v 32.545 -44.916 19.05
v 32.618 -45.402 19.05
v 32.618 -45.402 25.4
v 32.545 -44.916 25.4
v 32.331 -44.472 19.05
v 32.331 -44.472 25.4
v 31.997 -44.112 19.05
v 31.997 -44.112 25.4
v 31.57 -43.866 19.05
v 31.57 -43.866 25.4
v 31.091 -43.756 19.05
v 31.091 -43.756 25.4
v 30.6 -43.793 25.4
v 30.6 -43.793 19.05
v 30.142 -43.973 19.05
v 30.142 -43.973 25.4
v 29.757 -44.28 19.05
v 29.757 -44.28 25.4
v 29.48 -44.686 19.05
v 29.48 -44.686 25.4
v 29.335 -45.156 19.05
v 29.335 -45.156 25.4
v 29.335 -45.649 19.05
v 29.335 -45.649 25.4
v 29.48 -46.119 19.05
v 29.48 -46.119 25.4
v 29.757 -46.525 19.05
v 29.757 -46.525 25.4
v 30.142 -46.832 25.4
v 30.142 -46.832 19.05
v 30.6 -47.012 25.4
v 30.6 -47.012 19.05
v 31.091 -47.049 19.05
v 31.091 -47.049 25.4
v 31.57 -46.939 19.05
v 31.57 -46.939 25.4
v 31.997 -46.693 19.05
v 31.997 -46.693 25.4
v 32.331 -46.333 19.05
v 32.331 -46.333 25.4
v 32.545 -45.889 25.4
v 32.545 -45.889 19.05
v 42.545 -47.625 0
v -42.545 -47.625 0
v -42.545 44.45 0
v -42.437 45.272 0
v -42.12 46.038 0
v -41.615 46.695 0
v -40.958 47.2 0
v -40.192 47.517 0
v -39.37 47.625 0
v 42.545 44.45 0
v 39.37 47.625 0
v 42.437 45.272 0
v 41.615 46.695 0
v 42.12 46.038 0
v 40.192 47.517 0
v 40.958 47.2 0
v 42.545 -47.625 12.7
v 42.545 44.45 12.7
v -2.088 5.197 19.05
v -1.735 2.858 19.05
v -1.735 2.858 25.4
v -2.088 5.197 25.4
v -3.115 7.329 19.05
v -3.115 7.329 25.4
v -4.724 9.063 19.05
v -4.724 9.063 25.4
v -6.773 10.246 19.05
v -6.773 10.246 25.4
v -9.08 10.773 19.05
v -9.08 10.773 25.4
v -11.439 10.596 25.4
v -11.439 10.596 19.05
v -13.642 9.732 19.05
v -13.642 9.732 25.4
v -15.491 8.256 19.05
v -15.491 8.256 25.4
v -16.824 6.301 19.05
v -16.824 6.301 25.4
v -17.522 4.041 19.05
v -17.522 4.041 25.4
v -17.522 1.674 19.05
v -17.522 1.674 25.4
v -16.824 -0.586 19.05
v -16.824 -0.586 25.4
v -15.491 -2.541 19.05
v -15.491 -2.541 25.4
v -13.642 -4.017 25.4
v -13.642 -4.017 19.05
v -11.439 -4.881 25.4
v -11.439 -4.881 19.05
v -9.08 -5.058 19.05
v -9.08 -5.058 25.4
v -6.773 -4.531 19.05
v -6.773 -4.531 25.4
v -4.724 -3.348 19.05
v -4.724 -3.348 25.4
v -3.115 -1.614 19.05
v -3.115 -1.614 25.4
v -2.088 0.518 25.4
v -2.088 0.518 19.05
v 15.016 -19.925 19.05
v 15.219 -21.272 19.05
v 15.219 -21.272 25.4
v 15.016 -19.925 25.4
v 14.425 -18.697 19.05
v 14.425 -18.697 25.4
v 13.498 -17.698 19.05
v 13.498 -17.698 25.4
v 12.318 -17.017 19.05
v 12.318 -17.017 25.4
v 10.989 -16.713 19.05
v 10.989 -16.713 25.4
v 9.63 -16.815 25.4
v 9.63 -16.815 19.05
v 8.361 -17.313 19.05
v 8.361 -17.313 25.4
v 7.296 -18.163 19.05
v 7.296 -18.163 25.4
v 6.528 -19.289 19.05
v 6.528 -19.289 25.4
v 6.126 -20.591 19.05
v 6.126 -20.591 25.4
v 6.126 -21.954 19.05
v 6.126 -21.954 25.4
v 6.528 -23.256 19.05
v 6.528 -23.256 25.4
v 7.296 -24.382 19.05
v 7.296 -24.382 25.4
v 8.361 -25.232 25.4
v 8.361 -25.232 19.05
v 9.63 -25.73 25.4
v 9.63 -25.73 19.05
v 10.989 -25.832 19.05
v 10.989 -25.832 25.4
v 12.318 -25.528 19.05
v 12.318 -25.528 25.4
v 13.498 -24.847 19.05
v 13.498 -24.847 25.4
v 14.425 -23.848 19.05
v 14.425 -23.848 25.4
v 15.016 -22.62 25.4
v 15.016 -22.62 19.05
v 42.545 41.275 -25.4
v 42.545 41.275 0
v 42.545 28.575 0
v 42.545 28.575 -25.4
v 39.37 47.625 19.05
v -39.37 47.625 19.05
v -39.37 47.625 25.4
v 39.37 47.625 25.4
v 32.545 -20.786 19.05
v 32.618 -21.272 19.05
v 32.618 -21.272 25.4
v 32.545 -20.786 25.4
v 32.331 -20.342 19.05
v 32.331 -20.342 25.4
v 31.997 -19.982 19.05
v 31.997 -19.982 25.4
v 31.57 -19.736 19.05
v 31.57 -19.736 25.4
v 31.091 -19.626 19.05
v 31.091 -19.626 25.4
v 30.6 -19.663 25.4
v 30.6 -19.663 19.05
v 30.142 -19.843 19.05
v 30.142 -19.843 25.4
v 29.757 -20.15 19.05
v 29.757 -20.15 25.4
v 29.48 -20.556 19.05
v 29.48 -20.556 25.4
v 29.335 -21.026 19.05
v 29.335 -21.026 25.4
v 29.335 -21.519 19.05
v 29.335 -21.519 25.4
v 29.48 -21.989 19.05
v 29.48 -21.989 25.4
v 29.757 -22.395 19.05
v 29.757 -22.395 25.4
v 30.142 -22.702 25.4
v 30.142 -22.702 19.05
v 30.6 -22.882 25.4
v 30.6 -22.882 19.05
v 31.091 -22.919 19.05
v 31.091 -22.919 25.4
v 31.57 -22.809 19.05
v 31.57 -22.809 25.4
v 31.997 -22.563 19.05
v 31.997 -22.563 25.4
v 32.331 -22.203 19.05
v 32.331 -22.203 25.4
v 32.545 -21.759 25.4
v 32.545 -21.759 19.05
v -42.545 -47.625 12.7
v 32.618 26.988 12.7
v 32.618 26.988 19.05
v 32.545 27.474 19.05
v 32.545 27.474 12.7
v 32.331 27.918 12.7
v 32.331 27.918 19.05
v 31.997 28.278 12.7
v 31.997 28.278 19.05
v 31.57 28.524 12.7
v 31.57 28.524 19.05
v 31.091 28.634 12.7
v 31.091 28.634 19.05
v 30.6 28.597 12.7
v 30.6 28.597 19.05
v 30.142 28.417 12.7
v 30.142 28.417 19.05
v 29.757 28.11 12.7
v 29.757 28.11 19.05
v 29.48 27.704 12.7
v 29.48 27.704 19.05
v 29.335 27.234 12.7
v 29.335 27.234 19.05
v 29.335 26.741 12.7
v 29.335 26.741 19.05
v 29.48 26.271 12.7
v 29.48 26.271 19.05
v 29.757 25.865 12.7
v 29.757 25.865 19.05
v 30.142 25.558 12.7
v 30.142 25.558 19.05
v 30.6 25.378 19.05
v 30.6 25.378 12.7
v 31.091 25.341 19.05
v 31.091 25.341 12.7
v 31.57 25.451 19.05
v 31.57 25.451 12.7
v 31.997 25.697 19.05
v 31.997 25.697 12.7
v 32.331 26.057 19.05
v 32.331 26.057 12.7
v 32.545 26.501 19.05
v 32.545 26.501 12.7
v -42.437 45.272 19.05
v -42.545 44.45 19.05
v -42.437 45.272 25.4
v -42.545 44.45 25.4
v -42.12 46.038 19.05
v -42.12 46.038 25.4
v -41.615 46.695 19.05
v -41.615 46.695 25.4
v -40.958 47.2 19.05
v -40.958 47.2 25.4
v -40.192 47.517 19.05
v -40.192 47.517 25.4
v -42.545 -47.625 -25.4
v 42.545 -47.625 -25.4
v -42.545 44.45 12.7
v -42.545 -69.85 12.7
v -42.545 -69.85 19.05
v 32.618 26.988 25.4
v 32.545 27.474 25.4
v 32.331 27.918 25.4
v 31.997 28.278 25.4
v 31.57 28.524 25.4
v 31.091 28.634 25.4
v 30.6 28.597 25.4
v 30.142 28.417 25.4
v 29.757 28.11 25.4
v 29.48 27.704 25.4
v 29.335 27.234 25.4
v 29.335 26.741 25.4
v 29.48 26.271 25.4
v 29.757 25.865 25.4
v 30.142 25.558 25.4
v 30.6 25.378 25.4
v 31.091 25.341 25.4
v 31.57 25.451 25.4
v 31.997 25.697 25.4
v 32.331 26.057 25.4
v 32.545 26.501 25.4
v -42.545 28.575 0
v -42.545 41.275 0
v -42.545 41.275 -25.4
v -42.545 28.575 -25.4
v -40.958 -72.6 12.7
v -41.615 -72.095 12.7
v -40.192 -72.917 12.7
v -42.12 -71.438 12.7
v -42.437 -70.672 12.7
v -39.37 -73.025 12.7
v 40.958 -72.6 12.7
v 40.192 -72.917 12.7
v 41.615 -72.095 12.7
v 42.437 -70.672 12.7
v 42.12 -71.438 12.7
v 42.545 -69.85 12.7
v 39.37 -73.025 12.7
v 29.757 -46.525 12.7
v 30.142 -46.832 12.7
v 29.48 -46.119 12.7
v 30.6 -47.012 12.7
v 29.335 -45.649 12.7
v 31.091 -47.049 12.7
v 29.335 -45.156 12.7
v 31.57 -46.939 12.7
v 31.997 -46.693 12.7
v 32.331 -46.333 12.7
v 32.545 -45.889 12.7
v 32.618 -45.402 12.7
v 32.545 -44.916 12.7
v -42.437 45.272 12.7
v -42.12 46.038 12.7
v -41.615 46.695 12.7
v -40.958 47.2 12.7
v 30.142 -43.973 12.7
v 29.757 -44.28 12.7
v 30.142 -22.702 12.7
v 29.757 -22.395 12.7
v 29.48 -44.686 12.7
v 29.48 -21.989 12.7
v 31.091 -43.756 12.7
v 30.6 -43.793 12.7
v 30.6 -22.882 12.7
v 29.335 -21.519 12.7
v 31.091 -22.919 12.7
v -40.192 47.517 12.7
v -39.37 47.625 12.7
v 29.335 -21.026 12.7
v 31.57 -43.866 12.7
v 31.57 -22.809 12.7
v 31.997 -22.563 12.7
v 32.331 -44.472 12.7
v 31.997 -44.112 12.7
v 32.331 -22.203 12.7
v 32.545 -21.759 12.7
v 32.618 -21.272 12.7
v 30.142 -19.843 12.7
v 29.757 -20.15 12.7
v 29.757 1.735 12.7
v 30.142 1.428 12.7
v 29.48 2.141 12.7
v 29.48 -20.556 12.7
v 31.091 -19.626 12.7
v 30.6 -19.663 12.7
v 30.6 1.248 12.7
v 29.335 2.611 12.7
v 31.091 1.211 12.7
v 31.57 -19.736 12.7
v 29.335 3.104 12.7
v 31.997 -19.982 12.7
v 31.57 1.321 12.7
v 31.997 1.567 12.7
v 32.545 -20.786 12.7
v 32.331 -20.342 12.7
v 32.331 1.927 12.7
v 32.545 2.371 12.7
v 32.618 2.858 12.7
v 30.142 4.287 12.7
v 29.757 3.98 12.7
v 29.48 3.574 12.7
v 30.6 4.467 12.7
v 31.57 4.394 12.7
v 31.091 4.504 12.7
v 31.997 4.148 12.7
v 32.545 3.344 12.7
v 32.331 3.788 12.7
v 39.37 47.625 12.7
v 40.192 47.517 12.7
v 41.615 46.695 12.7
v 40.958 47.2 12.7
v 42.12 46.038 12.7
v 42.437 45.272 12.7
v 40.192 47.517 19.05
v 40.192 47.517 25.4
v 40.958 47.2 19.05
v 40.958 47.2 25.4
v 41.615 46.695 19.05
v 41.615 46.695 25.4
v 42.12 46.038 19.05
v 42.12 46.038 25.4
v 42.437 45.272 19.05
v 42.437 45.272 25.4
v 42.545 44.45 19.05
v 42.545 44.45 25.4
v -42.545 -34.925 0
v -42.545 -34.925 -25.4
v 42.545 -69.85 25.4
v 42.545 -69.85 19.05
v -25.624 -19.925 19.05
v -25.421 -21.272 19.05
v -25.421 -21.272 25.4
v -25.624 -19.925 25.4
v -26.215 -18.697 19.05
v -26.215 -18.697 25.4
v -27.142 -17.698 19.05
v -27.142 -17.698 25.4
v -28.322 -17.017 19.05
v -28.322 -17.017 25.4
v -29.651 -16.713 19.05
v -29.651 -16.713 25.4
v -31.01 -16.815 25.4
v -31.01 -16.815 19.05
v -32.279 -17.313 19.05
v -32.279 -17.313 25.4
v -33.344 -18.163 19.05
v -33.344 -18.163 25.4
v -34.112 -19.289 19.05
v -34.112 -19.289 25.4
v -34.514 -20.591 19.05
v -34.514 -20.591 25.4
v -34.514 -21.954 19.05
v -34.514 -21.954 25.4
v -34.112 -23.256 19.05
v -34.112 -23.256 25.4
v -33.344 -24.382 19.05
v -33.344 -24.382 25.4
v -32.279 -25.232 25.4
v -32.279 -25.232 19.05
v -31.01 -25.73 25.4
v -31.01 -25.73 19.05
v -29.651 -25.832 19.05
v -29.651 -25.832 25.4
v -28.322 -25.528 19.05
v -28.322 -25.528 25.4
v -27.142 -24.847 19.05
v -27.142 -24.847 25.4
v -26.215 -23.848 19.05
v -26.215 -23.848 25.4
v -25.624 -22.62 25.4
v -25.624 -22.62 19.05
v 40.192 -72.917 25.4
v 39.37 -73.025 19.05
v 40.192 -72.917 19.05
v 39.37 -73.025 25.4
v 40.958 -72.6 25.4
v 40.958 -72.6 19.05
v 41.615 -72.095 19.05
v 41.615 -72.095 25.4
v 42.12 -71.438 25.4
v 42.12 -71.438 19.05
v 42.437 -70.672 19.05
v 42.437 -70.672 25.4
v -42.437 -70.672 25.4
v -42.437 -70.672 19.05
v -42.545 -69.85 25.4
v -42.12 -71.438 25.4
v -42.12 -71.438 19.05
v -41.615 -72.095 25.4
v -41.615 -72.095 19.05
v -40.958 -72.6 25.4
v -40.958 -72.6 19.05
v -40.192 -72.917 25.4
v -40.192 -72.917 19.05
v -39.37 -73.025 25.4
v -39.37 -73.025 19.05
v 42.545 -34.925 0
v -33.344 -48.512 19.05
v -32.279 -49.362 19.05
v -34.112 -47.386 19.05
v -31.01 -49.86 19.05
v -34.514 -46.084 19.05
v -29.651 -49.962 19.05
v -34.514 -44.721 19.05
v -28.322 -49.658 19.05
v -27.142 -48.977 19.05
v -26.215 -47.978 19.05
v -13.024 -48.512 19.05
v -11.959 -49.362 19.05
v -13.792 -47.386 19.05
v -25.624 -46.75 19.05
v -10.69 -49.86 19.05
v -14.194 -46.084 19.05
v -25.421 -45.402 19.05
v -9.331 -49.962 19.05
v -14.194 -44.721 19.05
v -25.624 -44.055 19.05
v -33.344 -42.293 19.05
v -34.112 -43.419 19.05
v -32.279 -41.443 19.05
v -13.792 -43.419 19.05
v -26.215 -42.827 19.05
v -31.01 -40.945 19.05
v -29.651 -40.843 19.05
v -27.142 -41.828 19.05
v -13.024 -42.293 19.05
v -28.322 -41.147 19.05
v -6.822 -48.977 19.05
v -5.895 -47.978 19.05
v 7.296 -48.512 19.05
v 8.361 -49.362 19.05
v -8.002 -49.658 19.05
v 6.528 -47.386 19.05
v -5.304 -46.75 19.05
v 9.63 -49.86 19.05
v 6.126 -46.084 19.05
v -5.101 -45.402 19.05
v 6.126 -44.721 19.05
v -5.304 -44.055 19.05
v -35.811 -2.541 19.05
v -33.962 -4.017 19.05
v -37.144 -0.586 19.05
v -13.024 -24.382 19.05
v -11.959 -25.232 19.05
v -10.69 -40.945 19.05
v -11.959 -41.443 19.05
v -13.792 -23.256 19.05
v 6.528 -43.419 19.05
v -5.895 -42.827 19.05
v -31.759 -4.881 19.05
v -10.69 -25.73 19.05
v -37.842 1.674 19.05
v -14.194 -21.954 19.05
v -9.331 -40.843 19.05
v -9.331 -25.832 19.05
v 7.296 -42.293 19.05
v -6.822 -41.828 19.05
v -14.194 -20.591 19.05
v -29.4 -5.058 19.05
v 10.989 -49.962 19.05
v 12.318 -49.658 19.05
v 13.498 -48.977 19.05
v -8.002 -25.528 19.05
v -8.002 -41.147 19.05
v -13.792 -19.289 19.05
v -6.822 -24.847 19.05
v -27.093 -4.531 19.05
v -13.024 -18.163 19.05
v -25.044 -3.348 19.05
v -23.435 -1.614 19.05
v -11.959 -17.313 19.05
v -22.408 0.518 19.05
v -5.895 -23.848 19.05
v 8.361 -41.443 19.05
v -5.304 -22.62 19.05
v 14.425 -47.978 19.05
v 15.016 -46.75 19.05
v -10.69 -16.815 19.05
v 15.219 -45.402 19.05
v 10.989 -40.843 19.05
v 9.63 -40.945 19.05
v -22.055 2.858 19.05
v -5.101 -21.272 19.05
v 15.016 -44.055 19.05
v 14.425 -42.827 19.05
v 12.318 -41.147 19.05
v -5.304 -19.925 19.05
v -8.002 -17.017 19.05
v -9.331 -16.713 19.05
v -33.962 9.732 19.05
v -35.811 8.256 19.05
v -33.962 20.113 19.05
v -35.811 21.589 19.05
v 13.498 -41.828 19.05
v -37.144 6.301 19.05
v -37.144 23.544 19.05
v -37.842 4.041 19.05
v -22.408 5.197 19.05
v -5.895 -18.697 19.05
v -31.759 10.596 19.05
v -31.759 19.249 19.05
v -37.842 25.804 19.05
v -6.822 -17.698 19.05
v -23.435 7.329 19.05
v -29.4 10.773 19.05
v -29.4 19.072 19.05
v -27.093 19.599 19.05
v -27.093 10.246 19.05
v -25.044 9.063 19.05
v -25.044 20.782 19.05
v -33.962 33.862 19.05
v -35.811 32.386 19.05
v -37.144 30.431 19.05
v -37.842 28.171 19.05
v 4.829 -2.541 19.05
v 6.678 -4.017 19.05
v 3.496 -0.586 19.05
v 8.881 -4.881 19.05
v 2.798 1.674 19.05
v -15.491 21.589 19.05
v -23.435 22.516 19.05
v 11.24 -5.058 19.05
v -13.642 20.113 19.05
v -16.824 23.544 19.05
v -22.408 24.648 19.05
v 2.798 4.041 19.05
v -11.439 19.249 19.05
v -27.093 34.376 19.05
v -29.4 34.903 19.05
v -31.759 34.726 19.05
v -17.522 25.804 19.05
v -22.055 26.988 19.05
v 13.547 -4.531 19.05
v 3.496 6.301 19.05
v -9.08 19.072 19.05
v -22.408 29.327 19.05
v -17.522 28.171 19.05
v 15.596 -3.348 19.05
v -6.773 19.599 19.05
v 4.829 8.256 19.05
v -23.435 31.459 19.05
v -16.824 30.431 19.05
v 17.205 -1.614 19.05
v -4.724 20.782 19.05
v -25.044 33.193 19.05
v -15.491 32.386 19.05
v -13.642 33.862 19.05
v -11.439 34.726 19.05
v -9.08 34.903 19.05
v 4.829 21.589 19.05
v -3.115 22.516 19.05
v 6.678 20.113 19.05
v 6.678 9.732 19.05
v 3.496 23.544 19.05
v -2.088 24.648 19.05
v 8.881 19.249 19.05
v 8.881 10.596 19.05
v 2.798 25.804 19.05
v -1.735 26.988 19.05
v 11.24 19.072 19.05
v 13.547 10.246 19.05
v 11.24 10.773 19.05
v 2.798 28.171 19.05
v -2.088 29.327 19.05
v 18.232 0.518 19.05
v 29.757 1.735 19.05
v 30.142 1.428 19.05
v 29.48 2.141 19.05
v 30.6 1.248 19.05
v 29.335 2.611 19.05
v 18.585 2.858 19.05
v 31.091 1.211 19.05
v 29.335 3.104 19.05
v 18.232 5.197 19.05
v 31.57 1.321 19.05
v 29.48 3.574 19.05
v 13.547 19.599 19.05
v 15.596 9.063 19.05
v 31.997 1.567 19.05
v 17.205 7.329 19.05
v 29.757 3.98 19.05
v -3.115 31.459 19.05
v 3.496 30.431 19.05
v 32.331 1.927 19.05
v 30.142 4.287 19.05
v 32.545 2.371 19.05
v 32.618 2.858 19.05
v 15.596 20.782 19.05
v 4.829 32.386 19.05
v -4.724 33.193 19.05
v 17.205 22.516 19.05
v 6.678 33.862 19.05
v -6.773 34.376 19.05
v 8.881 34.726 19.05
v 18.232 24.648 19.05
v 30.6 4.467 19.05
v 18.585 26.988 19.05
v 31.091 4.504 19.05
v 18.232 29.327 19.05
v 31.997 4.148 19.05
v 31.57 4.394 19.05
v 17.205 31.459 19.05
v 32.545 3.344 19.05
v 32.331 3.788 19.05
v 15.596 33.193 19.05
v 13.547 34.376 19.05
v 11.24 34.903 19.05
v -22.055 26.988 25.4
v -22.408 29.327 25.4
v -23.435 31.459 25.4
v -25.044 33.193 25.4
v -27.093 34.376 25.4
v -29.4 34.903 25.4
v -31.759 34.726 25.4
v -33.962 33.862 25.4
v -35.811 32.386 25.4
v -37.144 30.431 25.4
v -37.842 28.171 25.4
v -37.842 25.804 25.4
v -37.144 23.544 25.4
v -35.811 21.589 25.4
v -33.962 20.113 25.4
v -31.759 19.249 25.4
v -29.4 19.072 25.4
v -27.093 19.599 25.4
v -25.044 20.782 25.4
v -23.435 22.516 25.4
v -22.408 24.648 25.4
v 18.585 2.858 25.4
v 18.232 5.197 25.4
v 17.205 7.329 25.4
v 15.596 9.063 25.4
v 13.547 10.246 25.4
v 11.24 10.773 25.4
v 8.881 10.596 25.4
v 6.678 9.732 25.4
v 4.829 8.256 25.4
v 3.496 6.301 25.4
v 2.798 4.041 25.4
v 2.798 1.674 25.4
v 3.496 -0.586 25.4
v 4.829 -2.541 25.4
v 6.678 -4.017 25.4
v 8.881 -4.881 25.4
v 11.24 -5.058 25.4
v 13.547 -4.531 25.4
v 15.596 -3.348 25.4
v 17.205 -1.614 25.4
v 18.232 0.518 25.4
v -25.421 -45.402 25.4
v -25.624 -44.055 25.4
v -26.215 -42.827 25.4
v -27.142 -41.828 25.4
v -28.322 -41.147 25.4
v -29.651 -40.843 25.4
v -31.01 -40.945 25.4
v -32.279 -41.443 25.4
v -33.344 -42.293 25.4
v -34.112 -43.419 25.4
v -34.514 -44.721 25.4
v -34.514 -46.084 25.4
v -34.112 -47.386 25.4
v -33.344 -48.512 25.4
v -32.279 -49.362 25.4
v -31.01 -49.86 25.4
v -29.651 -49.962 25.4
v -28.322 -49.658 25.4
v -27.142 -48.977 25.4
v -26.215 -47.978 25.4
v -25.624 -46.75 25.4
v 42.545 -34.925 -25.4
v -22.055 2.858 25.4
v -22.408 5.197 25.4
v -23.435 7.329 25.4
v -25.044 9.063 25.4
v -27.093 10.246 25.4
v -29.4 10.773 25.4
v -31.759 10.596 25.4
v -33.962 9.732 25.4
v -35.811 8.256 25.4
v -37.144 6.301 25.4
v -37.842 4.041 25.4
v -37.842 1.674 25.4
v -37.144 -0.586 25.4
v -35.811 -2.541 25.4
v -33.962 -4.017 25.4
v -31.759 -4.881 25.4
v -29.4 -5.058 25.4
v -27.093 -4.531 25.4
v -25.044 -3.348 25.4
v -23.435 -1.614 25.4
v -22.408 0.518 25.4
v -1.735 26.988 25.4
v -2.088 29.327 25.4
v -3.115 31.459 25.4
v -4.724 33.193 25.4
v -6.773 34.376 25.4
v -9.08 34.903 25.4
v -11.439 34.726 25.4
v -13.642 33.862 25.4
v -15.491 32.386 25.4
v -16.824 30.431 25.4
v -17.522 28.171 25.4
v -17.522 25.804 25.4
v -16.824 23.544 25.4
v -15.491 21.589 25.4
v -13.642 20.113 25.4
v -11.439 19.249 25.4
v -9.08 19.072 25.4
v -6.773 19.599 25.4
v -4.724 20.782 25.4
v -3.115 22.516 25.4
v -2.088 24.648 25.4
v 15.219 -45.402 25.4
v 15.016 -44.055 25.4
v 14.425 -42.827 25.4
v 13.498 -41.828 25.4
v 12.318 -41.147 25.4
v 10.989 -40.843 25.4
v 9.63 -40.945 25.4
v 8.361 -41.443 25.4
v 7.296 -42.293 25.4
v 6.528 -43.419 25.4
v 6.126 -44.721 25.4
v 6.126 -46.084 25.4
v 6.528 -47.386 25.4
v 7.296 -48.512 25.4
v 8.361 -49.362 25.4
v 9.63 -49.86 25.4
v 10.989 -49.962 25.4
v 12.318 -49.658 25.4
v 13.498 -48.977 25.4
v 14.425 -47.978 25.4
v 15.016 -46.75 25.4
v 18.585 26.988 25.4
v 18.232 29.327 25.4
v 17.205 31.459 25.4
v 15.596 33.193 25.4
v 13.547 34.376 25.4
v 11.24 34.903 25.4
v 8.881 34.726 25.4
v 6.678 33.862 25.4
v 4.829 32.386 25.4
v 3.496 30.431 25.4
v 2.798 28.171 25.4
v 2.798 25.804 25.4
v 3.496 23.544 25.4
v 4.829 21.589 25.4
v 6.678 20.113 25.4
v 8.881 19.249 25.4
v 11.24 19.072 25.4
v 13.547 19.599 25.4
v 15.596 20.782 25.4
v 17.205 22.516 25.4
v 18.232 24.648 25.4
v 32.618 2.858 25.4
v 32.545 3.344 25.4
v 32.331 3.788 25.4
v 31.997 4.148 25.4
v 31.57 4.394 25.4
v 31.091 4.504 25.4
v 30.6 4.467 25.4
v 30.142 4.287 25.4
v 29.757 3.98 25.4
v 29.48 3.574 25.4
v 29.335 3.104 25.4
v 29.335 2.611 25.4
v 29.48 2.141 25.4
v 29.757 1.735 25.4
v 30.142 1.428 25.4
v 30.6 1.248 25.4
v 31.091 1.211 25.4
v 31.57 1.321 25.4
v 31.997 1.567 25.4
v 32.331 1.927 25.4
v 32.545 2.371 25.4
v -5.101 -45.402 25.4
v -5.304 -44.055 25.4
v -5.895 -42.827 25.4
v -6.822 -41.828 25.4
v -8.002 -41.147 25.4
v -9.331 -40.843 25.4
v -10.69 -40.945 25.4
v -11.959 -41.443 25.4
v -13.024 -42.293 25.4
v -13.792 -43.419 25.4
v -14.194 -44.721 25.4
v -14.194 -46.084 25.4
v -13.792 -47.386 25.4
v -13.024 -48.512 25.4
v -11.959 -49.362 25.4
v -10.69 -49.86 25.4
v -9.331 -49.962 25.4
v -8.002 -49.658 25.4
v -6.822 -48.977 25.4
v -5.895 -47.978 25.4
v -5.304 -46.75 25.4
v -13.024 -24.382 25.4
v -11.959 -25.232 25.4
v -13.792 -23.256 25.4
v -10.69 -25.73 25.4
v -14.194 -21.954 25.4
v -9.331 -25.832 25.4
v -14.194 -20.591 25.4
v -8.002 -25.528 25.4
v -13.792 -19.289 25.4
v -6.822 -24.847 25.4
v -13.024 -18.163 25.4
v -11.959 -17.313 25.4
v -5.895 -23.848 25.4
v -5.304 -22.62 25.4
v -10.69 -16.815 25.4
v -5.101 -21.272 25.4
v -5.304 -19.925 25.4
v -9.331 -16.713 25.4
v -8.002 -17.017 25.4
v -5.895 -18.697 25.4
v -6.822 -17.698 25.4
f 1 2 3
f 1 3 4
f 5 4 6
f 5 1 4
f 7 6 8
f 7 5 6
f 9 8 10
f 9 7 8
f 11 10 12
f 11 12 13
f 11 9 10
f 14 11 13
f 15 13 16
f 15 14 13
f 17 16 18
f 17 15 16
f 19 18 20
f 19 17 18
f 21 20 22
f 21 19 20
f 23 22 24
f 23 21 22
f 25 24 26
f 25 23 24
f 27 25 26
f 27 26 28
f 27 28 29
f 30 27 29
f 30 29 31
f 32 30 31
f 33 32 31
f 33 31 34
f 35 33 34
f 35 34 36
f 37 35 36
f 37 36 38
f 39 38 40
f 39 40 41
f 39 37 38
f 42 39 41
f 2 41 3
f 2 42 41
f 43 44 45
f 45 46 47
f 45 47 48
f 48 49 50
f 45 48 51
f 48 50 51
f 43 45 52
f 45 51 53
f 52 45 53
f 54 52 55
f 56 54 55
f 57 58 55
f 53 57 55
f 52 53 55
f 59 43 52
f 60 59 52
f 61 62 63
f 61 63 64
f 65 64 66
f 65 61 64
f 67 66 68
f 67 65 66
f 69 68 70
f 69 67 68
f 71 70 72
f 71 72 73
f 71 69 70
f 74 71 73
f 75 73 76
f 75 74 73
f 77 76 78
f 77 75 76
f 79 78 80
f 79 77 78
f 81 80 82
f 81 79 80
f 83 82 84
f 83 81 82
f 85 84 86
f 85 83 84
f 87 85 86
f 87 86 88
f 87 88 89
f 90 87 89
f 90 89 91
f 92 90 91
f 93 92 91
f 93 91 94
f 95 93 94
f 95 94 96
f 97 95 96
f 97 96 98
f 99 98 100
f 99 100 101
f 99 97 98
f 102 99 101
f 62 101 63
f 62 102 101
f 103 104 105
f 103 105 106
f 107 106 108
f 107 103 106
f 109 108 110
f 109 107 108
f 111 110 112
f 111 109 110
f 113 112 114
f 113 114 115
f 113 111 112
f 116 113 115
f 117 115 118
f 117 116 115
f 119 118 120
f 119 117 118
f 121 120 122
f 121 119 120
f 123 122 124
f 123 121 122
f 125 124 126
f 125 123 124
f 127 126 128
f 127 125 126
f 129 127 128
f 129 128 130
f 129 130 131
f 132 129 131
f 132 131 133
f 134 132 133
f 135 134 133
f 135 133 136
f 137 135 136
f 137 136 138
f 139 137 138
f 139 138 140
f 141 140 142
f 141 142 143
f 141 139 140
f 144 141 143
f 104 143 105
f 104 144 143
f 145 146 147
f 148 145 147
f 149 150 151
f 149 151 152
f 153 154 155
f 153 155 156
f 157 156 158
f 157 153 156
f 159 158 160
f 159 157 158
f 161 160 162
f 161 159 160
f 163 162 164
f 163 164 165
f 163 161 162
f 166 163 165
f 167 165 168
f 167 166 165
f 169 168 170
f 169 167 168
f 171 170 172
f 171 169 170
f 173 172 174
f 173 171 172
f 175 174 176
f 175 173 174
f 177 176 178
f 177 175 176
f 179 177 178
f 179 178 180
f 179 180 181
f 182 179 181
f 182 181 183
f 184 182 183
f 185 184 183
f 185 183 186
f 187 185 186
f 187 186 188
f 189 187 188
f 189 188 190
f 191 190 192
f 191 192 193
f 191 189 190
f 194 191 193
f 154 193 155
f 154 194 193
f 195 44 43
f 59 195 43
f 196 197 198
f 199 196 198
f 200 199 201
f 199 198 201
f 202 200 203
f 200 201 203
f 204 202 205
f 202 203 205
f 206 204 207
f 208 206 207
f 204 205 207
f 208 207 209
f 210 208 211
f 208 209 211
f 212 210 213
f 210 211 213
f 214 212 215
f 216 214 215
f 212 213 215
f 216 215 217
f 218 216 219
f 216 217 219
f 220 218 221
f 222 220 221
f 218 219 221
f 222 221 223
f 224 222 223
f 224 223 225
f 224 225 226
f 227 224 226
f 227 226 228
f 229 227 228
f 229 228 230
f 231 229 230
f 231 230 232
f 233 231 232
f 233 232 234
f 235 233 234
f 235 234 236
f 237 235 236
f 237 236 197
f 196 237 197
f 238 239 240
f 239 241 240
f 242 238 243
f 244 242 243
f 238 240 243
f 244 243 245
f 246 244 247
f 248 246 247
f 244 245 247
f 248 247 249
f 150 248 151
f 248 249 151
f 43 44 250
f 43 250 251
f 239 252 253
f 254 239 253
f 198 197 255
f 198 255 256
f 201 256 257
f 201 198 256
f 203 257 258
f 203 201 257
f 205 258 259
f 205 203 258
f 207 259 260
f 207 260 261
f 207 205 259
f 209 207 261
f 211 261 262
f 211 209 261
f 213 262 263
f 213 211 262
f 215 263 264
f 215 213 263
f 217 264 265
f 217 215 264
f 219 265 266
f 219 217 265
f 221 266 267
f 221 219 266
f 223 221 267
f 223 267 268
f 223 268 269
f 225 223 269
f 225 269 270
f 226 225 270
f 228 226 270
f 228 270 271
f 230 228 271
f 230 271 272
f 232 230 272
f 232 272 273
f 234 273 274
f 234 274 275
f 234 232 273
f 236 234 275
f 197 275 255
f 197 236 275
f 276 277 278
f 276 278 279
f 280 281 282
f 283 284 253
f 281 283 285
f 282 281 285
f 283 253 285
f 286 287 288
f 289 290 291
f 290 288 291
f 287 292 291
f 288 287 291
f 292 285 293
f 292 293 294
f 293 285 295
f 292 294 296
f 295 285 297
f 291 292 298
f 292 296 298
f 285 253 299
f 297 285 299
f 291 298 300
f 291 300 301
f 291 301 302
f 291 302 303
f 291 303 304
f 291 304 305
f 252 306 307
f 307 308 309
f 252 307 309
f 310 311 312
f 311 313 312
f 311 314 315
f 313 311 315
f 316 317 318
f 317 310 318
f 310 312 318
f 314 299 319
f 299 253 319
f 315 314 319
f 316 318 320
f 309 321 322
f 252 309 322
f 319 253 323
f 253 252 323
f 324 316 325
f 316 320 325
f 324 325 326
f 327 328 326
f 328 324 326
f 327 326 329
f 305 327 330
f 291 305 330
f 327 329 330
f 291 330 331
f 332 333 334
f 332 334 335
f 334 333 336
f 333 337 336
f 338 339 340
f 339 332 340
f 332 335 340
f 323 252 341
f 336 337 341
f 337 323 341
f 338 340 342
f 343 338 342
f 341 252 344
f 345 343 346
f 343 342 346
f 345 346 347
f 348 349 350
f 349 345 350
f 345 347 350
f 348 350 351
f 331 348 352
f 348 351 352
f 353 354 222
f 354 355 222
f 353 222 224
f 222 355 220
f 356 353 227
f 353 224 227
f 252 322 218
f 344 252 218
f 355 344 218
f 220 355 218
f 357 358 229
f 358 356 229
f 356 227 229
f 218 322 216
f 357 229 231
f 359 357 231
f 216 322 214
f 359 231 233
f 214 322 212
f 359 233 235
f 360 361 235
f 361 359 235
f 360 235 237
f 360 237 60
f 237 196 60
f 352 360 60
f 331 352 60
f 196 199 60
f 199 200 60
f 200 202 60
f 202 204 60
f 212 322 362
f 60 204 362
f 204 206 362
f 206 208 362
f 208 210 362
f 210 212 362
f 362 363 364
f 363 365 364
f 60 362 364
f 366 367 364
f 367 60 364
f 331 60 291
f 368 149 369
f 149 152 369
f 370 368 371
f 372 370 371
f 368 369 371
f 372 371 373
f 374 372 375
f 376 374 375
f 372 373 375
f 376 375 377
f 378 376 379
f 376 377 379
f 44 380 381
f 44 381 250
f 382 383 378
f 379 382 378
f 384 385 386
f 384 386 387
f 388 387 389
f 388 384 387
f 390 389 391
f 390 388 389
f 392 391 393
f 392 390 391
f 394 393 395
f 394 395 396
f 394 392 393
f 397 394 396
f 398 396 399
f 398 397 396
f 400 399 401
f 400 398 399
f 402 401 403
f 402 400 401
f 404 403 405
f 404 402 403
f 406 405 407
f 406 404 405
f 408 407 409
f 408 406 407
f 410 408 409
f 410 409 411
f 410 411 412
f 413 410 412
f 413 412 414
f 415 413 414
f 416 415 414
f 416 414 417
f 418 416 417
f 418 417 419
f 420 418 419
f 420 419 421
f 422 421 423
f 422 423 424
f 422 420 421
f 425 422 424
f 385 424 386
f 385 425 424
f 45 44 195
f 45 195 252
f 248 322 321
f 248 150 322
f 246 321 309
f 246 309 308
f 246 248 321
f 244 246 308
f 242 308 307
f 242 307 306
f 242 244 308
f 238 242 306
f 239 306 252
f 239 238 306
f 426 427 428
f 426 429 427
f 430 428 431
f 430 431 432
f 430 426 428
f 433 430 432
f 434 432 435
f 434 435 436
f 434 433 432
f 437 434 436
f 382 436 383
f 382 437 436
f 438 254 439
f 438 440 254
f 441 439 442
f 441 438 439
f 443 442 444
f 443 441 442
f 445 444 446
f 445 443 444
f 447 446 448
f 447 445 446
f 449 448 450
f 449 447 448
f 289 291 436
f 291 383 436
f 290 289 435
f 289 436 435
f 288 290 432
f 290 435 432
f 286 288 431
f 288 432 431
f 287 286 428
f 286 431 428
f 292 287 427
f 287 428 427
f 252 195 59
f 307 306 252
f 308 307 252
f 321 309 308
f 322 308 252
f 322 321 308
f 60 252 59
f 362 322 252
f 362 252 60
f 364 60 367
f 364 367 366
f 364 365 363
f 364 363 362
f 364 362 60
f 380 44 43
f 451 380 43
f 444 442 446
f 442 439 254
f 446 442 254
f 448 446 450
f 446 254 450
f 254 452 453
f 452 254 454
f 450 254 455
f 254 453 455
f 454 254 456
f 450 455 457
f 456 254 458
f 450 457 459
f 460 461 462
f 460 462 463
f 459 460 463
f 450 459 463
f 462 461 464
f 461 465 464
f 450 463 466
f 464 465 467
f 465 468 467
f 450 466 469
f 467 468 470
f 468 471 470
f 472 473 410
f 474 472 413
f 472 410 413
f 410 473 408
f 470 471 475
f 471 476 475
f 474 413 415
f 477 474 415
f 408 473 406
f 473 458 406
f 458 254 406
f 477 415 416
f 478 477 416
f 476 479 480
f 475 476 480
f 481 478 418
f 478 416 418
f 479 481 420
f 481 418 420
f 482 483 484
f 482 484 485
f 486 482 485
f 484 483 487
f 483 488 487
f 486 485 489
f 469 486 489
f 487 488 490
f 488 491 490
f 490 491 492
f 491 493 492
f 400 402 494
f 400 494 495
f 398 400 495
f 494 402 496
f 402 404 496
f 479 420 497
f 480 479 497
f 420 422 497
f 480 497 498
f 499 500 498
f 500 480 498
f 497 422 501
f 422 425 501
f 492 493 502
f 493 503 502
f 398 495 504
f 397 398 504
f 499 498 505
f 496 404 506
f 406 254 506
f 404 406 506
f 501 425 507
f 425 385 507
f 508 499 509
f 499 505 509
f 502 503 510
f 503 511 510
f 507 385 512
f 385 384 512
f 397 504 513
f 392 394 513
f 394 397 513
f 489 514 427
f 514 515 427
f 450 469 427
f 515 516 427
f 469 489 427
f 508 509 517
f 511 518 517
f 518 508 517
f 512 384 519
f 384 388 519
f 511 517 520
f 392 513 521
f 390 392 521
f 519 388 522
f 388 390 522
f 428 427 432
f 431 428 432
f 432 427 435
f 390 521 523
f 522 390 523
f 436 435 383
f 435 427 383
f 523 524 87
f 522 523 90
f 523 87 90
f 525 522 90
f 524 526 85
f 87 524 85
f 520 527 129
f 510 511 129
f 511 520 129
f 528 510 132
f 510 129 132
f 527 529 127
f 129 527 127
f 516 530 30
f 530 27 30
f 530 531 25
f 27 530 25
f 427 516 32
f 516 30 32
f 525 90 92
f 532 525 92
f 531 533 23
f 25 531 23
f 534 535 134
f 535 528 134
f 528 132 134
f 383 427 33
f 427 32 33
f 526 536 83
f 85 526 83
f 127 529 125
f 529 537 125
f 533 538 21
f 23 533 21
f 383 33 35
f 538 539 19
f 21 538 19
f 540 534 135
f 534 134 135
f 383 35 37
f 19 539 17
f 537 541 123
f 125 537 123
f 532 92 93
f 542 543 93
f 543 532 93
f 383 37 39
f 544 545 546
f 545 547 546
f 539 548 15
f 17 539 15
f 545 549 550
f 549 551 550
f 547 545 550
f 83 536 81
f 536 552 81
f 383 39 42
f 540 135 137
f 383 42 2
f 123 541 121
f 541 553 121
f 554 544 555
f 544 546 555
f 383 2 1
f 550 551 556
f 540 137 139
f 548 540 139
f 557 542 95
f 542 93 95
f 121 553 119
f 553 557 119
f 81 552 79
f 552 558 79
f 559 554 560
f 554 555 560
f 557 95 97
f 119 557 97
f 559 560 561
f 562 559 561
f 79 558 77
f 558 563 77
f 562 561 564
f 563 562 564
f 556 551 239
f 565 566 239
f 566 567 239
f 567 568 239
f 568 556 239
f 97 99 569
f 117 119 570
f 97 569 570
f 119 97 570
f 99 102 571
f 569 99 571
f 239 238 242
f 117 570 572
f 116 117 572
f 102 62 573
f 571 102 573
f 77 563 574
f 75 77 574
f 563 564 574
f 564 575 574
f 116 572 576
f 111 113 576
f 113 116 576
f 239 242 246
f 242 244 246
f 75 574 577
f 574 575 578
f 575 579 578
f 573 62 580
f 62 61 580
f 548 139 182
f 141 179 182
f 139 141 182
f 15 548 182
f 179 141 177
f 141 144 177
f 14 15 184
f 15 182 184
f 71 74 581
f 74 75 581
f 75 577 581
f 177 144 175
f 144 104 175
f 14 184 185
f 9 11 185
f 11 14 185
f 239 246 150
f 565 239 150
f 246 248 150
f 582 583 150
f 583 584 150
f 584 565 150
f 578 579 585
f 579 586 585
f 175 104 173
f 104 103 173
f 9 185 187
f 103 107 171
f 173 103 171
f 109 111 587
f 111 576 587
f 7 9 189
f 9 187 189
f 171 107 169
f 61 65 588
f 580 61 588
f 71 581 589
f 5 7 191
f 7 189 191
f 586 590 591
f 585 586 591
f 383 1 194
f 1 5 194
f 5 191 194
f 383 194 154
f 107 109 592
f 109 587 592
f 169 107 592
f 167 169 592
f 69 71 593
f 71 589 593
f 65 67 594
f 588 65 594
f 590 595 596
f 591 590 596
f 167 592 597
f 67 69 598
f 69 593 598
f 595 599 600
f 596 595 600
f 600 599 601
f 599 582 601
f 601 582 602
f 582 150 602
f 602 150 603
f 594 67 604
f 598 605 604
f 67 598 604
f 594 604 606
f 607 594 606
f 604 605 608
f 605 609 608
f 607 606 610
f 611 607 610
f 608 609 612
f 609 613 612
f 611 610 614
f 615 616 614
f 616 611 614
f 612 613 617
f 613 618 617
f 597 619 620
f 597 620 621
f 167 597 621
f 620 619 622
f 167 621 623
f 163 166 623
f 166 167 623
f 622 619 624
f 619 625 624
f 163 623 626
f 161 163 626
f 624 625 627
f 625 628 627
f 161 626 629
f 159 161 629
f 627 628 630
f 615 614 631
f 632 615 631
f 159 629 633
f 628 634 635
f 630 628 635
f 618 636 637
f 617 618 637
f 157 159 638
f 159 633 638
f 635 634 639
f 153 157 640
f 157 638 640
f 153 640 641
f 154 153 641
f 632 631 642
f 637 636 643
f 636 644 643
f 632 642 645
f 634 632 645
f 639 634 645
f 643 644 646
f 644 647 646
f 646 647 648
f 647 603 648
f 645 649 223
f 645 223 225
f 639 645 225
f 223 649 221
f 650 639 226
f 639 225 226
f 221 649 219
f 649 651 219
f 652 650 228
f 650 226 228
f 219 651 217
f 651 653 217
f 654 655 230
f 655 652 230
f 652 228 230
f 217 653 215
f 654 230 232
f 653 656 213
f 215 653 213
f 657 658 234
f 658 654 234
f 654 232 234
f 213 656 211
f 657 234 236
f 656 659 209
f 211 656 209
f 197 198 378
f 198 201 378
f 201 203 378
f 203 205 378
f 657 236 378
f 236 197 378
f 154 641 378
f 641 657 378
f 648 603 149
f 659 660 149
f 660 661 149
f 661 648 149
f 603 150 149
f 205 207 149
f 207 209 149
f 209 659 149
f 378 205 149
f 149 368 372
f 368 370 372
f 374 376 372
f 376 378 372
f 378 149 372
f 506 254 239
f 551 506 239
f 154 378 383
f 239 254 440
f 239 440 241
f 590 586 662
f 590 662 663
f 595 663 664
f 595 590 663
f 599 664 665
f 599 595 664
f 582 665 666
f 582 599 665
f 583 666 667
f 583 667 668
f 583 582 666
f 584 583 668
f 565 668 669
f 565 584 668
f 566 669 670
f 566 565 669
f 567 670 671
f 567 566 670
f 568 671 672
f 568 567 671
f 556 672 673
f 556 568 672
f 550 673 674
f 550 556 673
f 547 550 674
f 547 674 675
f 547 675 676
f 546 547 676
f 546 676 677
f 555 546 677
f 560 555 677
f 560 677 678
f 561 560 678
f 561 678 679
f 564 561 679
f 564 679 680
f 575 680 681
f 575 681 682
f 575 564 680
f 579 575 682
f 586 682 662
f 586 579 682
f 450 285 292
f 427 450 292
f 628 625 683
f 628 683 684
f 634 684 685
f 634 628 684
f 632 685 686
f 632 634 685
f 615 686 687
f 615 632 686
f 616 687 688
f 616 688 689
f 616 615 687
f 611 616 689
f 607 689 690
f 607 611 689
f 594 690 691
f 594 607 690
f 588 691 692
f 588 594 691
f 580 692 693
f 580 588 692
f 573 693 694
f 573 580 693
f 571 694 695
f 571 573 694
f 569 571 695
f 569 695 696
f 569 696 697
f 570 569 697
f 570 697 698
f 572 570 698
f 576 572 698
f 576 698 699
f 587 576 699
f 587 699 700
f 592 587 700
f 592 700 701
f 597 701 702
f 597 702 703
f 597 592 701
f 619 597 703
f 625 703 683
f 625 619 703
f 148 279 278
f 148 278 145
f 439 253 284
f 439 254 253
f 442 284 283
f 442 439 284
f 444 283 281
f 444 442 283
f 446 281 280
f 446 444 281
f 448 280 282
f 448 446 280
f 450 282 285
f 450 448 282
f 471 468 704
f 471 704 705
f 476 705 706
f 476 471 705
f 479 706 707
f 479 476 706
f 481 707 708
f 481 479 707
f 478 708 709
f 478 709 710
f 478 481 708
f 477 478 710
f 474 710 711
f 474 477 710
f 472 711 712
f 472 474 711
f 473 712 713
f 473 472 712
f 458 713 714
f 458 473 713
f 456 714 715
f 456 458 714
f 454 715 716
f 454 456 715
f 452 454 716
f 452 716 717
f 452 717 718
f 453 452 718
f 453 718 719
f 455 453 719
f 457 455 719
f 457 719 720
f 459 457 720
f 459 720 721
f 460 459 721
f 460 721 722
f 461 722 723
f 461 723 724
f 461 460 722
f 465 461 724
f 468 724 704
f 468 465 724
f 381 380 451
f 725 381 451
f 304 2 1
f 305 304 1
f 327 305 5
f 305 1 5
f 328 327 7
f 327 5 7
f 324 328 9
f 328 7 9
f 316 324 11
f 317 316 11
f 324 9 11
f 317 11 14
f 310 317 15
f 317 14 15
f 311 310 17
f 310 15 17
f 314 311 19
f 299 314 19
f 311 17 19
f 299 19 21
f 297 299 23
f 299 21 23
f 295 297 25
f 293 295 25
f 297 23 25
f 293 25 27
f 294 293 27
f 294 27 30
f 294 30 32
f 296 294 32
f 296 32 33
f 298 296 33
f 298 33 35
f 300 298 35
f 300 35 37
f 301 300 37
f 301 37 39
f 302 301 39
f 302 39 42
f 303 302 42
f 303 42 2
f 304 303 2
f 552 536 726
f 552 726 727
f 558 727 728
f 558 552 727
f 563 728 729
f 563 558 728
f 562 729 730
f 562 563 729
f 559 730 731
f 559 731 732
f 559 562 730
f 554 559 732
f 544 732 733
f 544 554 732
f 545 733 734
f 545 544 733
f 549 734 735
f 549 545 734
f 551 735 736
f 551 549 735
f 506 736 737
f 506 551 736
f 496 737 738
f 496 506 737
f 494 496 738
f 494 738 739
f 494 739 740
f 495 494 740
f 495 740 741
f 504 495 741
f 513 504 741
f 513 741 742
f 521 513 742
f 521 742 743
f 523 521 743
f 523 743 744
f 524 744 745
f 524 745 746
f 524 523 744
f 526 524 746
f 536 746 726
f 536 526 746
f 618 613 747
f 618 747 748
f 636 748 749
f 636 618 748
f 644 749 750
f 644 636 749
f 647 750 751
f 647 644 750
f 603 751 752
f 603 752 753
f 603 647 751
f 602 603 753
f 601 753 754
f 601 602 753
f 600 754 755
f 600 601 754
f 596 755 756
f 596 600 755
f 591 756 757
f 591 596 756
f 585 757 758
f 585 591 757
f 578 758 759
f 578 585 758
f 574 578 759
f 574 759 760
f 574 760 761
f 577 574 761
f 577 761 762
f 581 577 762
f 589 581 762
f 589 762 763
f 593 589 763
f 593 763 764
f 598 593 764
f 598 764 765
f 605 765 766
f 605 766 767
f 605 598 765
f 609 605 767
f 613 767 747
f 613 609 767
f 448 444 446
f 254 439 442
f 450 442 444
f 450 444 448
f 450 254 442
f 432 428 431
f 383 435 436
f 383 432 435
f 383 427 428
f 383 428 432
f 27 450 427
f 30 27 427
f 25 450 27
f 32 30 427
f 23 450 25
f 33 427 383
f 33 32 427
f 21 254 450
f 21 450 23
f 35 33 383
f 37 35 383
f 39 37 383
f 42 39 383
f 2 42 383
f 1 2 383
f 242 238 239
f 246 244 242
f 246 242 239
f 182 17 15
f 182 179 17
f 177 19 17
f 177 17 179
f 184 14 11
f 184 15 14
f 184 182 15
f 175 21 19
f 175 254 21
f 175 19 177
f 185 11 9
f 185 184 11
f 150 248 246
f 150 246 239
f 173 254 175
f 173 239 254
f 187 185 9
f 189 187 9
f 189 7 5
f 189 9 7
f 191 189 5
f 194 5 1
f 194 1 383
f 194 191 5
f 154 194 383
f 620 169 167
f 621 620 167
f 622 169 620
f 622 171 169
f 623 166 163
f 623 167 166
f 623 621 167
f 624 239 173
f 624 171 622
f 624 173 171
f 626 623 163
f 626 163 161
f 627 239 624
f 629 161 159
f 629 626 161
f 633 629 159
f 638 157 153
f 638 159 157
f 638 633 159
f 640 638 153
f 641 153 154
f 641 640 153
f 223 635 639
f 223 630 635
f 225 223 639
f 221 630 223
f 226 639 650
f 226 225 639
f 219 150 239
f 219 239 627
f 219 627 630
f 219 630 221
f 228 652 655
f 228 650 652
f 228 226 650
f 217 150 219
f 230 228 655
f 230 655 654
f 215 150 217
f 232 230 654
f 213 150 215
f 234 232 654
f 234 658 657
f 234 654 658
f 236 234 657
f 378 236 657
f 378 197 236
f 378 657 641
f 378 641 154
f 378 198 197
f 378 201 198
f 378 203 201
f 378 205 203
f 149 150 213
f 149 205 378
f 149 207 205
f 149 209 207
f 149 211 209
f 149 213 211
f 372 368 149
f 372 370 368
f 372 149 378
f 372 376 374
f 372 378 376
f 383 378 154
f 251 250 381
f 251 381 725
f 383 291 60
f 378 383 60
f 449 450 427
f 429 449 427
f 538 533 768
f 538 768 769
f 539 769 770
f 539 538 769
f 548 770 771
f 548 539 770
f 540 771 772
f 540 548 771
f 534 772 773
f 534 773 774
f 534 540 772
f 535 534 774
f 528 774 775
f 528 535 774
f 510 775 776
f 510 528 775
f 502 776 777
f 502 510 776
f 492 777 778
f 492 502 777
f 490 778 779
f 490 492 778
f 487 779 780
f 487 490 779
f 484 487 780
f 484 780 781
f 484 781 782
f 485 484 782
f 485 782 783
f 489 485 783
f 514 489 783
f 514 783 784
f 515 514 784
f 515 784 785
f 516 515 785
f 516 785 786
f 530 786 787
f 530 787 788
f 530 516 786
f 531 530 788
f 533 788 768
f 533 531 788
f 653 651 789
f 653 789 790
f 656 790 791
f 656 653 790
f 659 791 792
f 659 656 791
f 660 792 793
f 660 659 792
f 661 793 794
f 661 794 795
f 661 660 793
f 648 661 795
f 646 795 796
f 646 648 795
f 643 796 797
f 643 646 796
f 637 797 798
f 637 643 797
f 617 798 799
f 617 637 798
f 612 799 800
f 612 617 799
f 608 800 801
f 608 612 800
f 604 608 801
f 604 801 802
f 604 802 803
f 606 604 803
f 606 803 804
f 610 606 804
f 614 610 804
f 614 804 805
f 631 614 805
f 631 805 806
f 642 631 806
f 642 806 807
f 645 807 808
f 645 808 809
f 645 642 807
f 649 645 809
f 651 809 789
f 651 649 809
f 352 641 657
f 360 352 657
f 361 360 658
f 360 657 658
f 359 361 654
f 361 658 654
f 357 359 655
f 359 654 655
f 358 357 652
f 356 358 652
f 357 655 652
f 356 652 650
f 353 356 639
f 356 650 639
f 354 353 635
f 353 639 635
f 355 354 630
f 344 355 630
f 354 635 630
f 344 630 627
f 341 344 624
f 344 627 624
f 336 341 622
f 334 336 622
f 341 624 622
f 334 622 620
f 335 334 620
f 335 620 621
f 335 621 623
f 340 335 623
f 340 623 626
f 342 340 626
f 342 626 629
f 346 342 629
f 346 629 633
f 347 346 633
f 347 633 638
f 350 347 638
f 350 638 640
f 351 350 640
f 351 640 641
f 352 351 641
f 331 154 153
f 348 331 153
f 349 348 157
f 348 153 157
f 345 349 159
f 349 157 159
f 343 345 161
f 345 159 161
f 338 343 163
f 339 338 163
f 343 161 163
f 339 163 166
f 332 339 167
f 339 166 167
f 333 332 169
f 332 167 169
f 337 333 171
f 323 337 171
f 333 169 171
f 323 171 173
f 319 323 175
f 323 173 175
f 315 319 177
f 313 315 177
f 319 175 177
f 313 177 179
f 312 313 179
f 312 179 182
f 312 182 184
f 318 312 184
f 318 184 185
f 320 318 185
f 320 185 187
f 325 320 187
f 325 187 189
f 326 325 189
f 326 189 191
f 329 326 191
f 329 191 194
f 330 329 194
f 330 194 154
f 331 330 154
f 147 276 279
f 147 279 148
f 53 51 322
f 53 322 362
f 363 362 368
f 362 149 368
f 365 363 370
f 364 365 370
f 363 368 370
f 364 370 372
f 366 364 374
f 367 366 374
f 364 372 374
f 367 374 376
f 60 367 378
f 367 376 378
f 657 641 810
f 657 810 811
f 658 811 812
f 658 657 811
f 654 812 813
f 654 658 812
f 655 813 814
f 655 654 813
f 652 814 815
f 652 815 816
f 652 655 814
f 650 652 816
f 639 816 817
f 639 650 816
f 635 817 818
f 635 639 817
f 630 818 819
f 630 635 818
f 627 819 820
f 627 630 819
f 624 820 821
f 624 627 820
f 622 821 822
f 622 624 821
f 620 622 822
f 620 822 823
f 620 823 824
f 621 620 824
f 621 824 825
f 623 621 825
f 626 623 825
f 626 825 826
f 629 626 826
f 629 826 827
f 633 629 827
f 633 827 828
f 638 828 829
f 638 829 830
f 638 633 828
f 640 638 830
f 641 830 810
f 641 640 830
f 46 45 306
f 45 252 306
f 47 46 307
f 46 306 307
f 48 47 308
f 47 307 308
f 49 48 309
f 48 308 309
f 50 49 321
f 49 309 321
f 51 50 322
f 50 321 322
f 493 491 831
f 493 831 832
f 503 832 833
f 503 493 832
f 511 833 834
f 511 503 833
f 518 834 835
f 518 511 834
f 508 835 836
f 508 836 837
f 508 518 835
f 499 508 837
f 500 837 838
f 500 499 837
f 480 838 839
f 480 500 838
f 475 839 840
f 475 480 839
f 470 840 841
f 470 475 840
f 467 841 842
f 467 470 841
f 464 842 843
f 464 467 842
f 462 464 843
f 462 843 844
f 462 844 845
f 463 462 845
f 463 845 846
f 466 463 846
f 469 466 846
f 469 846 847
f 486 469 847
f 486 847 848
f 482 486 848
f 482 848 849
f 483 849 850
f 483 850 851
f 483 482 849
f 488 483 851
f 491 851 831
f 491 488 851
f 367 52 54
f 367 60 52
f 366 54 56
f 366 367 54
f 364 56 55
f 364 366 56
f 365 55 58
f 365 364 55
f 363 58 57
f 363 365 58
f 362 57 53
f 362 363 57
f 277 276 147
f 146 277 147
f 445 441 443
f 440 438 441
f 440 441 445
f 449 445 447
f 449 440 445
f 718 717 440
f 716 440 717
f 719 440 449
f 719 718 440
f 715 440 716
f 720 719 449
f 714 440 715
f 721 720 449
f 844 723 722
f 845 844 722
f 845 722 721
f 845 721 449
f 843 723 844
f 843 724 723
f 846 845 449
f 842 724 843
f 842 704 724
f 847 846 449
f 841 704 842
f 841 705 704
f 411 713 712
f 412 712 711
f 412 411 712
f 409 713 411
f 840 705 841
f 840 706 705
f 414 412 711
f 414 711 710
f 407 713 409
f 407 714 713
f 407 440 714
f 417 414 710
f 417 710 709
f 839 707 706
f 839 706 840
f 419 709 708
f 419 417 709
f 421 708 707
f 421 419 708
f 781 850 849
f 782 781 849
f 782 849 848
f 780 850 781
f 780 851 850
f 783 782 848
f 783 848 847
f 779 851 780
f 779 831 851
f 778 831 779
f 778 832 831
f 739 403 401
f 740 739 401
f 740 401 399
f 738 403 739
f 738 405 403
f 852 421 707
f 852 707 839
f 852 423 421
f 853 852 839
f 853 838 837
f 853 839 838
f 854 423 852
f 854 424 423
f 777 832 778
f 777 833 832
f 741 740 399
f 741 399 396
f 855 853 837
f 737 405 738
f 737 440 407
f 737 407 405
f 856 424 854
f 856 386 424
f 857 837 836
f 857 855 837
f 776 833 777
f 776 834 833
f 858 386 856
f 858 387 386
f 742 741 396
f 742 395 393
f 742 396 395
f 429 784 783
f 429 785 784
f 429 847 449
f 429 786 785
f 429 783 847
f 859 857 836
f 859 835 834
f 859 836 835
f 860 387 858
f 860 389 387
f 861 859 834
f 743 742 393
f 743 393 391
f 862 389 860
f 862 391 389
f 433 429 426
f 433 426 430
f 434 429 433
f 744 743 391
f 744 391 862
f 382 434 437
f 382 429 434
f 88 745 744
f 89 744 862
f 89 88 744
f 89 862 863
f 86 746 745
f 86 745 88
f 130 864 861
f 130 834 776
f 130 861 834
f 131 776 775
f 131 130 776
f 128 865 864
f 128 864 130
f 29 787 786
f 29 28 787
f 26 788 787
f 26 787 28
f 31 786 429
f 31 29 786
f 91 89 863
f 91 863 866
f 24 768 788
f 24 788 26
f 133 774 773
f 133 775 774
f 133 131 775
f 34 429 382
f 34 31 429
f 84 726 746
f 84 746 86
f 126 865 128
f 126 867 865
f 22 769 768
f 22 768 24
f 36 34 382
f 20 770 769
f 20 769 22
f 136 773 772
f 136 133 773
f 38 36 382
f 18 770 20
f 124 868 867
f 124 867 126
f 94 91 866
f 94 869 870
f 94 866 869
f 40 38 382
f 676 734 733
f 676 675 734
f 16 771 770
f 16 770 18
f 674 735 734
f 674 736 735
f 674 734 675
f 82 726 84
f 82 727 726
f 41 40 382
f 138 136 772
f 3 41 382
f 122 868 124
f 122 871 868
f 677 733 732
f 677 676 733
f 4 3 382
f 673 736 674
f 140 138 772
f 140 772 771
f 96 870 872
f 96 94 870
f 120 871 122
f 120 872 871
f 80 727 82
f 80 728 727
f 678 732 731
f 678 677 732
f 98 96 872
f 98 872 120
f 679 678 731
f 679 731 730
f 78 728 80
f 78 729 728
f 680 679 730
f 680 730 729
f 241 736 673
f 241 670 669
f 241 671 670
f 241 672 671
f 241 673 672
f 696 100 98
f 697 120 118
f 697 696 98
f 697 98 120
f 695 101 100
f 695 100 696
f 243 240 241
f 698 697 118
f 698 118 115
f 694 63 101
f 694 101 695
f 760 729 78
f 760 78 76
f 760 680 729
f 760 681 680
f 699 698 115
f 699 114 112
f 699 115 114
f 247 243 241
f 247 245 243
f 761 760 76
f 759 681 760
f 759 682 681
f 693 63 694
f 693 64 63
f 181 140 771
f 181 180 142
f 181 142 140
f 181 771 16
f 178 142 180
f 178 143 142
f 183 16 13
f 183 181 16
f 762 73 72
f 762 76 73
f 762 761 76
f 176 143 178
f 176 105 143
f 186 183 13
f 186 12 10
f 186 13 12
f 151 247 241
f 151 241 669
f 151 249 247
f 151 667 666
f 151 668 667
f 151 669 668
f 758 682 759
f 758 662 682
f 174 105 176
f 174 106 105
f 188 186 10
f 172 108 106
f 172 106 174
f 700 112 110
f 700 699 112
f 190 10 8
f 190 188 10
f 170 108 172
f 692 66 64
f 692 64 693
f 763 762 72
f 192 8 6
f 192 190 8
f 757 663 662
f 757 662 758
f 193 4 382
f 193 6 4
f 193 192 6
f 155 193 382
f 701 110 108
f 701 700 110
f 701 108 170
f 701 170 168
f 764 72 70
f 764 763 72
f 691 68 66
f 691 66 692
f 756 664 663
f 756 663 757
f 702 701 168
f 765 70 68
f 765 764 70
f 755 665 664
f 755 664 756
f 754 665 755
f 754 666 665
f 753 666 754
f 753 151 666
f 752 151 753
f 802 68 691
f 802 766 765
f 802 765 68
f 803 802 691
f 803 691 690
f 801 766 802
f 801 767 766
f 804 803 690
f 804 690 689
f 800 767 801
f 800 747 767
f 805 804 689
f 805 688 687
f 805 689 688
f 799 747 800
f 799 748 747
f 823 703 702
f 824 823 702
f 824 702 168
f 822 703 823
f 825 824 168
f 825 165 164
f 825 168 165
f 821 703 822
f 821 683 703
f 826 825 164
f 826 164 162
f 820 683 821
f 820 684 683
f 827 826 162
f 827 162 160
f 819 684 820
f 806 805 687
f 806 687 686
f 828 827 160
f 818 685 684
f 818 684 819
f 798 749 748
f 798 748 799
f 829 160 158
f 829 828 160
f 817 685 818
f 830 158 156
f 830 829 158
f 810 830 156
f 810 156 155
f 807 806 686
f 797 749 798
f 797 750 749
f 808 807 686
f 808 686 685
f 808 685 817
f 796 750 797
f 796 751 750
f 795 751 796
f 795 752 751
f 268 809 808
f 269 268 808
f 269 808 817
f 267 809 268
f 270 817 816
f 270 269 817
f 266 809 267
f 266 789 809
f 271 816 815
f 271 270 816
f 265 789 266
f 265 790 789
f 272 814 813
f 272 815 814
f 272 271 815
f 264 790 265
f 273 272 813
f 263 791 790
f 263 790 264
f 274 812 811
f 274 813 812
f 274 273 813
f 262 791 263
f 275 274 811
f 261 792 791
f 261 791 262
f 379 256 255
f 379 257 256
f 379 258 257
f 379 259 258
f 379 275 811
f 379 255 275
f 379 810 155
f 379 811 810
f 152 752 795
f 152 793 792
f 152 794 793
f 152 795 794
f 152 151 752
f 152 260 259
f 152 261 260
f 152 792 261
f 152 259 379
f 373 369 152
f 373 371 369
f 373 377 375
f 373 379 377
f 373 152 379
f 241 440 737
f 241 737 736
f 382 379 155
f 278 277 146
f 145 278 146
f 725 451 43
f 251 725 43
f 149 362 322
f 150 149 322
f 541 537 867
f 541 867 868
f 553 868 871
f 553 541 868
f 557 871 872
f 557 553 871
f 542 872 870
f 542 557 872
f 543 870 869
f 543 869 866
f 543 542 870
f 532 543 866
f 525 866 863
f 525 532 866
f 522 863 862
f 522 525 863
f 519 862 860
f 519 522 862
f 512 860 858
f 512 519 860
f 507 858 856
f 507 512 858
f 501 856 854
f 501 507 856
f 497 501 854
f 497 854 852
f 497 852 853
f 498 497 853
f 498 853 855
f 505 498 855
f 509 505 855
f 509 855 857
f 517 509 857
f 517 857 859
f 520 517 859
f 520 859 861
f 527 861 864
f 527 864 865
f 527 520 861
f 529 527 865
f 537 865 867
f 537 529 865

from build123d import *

# Parameters (mm, degrees)
F0_W     = 85.09
F0_H     = 95.25
F1_DEPTH = 12.7
F3_DEPTH = 6.35
F4_W     = 85.09
F4_H     = 12.7
F5_DEPTH = 25.4
F6_W     = 85.09
F6_H     = 120.65
F6_R     = 4.572
F6_R_2   = 1.651
F6_R_3   = 7.9375
F7_DEPTH = 6.35
F8_R     = 1.651
F9_DEPTH = 25.4
F10_R    = 3.175
F10_2_R  = 3.175
F10_3_R  = 3.175


with BuildPart() as f1:
    # F0 (on Top) → F1 (new body)
    with BuildSketch(Plane.XY):
        Rectangle(F0_W, F0_H)
    extrude(amount=F1_DEPTH)

    # F10#3
    f10_3_edges = [f1.edges().sort_by_distance(p)[0] for p in [
        (42.545, 47.625, 6.35),
        (-42.545, 47.625, 6.35),
    ]]
    fillet(f10_3_edges, radius=F10_3_R)


with BuildPart() as f3:
    # F2 (on face) → F3 (new body)
    with BuildSketch(Plane.XY.offset(12.7)):
        Polygon((42.545, 47.625), (-42.545, 47.625), (-42.545, -73.025), (-36.195, -73.025), (-21.971, -73.025), (-7.112, -73.025), (7.112, -73.025), (21.971, -73.025), (36.195, -73.025), (42.545, -73.025), align=None)
    extrude(amount=F3_DEPTH)

    # F8 (on face) → F9 (cut)
    with BuildSketch(Plane.XY.offset(19.05)):
        with Locations((30.9671923435, -45.4025)):
            Circle(F8_R)
        with Locations((30.9671923435, -21.2725)):
            Circle(F8_R)
        with Locations((30.9671923435, 2.8575)):
            Circle(F8_R)
        with Locations((30.9671923435, 26.9875)):
            Circle(F8_R)
    extrude(amount=-F9_DEPTH, mode=Mode.SUBTRACT)

    # F10#2
    f10_2_edges = [f3.edges().sort_by_distance(p)[0] for p in [
        (42.545, -73.025, 15.875),
        (42.545, 47.625, 15.875),
        (-42.545, 47.625, 15.875),
        (-42.545, -73.025, 15.875),
    ]]
    fillet(f10_2_edges, radius=F10_2_R)


with BuildPart() as f5:
    # F4 (on face) → F5 (new body)
    with BuildSketch(Plane(origin=(0, 0, 0), x_dir=(1, 0, 0), z_dir=(0, 0, -1))):
        with Locations((0, 41.275)):
            Rectangle(F4_W, F4_H)
    extrude(amount=F5_DEPTH)


with BuildPart() as f5b:
    # F4 (on face) → F5, piece 2 (new body)
    with BuildSketch(Plane(origin=(0, 0, 0), x_dir=(1, 0, 0), z_dir=(0, 0, -1))):
        with Locations((0, -34.925)):
            Rectangle(F4_W, F4_H)
    extrude(amount=F5_DEPTH)


with BuildPart() as f7:
    # F6 (on face) → F7 (new body)
    with BuildSketch(Plane.XY.offset(19.05)):
        with Locations((0, -12.7)):
            Rectangle(F6_W, F6_H)
        with Locations((-29.9928076565, -45.4025)):
            Circle(F6_R, mode=Mode.SUBTRACT)
        with Locations((-9.6728076565, -45.4025)):
            Circle(F6_R, mode=Mode.SUBTRACT)
        with Locations((-29.9928076565, -21.2725)):
            Circle(F6_R, mode=Mode.SUBTRACT)
        with Locations((-9.6728076565, -21.2725)):
            Circle(F6_R, mode=Mode.SUBTRACT)
        with Locations((10.6471923435, -45.4025)):
            Circle(F6_R, mode=Mode.SUBTRACT)
        with Locations((30.9671923435, -45.4025)):
            Circle(F6_R_2, mode=Mode.SUBTRACT)
        with Locations((10.6471923435, -21.2725)):
            Circle(F6_R, mode=Mode.SUBTRACT)
        with Locations((30.9671923435, -21.2725)):
            Circle(F6_R_2, mode=Mode.SUBTRACT)
        with Locations((-29.9928076565, 2.8575)):
            Circle(F6_R_3, mode=Mode.SUBTRACT)
        with Locations((-9.6728076565, 2.8575)):
            Circle(F6_R_3, mode=Mode.SUBTRACT)
        with Locations((-29.9928076565, 26.9875)):
            Circle(F6_R_3, mode=Mode.SUBTRACT)
        with Locations((-9.6728076565, 26.9875)):
            Circle(F6_R_3, mode=Mode.SUBTRACT)
        with Locations((10.6471923435, 2.8575)):
            Circle(F6_R_3, mode=Mode.SUBTRACT)
        with Locations((30.9671923435, 2.8575)):
            Circle(F6_R_2, mode=Mode.SUBTRACT)
        with Locations((10.6471923435, 26.9875)):
            Circle(F6_R_3, mode=Mode.SUBTRACT)
        with Locations((30.9671923435, 26.9875)):
            Circle(F6_R_2, mode=Mode.SUBTRACT)
    extrude(amount=F7_DEPTH)

    # F10
    f10_edges = [f7.edges().sort_by_distance(p)[0] for p in [
        (42.545, -73.025, 22.225),
        (42.545, 47.625, 22.225),
        (-42.545, -73.025, 22.225),
        (-42.545, 47.625, 22.225),
    ]]
    fillet(f10_edges, radius=F10_R)


solid = Compound([f1.part, f3.part, f5.part, f5b.part, f7.part])
